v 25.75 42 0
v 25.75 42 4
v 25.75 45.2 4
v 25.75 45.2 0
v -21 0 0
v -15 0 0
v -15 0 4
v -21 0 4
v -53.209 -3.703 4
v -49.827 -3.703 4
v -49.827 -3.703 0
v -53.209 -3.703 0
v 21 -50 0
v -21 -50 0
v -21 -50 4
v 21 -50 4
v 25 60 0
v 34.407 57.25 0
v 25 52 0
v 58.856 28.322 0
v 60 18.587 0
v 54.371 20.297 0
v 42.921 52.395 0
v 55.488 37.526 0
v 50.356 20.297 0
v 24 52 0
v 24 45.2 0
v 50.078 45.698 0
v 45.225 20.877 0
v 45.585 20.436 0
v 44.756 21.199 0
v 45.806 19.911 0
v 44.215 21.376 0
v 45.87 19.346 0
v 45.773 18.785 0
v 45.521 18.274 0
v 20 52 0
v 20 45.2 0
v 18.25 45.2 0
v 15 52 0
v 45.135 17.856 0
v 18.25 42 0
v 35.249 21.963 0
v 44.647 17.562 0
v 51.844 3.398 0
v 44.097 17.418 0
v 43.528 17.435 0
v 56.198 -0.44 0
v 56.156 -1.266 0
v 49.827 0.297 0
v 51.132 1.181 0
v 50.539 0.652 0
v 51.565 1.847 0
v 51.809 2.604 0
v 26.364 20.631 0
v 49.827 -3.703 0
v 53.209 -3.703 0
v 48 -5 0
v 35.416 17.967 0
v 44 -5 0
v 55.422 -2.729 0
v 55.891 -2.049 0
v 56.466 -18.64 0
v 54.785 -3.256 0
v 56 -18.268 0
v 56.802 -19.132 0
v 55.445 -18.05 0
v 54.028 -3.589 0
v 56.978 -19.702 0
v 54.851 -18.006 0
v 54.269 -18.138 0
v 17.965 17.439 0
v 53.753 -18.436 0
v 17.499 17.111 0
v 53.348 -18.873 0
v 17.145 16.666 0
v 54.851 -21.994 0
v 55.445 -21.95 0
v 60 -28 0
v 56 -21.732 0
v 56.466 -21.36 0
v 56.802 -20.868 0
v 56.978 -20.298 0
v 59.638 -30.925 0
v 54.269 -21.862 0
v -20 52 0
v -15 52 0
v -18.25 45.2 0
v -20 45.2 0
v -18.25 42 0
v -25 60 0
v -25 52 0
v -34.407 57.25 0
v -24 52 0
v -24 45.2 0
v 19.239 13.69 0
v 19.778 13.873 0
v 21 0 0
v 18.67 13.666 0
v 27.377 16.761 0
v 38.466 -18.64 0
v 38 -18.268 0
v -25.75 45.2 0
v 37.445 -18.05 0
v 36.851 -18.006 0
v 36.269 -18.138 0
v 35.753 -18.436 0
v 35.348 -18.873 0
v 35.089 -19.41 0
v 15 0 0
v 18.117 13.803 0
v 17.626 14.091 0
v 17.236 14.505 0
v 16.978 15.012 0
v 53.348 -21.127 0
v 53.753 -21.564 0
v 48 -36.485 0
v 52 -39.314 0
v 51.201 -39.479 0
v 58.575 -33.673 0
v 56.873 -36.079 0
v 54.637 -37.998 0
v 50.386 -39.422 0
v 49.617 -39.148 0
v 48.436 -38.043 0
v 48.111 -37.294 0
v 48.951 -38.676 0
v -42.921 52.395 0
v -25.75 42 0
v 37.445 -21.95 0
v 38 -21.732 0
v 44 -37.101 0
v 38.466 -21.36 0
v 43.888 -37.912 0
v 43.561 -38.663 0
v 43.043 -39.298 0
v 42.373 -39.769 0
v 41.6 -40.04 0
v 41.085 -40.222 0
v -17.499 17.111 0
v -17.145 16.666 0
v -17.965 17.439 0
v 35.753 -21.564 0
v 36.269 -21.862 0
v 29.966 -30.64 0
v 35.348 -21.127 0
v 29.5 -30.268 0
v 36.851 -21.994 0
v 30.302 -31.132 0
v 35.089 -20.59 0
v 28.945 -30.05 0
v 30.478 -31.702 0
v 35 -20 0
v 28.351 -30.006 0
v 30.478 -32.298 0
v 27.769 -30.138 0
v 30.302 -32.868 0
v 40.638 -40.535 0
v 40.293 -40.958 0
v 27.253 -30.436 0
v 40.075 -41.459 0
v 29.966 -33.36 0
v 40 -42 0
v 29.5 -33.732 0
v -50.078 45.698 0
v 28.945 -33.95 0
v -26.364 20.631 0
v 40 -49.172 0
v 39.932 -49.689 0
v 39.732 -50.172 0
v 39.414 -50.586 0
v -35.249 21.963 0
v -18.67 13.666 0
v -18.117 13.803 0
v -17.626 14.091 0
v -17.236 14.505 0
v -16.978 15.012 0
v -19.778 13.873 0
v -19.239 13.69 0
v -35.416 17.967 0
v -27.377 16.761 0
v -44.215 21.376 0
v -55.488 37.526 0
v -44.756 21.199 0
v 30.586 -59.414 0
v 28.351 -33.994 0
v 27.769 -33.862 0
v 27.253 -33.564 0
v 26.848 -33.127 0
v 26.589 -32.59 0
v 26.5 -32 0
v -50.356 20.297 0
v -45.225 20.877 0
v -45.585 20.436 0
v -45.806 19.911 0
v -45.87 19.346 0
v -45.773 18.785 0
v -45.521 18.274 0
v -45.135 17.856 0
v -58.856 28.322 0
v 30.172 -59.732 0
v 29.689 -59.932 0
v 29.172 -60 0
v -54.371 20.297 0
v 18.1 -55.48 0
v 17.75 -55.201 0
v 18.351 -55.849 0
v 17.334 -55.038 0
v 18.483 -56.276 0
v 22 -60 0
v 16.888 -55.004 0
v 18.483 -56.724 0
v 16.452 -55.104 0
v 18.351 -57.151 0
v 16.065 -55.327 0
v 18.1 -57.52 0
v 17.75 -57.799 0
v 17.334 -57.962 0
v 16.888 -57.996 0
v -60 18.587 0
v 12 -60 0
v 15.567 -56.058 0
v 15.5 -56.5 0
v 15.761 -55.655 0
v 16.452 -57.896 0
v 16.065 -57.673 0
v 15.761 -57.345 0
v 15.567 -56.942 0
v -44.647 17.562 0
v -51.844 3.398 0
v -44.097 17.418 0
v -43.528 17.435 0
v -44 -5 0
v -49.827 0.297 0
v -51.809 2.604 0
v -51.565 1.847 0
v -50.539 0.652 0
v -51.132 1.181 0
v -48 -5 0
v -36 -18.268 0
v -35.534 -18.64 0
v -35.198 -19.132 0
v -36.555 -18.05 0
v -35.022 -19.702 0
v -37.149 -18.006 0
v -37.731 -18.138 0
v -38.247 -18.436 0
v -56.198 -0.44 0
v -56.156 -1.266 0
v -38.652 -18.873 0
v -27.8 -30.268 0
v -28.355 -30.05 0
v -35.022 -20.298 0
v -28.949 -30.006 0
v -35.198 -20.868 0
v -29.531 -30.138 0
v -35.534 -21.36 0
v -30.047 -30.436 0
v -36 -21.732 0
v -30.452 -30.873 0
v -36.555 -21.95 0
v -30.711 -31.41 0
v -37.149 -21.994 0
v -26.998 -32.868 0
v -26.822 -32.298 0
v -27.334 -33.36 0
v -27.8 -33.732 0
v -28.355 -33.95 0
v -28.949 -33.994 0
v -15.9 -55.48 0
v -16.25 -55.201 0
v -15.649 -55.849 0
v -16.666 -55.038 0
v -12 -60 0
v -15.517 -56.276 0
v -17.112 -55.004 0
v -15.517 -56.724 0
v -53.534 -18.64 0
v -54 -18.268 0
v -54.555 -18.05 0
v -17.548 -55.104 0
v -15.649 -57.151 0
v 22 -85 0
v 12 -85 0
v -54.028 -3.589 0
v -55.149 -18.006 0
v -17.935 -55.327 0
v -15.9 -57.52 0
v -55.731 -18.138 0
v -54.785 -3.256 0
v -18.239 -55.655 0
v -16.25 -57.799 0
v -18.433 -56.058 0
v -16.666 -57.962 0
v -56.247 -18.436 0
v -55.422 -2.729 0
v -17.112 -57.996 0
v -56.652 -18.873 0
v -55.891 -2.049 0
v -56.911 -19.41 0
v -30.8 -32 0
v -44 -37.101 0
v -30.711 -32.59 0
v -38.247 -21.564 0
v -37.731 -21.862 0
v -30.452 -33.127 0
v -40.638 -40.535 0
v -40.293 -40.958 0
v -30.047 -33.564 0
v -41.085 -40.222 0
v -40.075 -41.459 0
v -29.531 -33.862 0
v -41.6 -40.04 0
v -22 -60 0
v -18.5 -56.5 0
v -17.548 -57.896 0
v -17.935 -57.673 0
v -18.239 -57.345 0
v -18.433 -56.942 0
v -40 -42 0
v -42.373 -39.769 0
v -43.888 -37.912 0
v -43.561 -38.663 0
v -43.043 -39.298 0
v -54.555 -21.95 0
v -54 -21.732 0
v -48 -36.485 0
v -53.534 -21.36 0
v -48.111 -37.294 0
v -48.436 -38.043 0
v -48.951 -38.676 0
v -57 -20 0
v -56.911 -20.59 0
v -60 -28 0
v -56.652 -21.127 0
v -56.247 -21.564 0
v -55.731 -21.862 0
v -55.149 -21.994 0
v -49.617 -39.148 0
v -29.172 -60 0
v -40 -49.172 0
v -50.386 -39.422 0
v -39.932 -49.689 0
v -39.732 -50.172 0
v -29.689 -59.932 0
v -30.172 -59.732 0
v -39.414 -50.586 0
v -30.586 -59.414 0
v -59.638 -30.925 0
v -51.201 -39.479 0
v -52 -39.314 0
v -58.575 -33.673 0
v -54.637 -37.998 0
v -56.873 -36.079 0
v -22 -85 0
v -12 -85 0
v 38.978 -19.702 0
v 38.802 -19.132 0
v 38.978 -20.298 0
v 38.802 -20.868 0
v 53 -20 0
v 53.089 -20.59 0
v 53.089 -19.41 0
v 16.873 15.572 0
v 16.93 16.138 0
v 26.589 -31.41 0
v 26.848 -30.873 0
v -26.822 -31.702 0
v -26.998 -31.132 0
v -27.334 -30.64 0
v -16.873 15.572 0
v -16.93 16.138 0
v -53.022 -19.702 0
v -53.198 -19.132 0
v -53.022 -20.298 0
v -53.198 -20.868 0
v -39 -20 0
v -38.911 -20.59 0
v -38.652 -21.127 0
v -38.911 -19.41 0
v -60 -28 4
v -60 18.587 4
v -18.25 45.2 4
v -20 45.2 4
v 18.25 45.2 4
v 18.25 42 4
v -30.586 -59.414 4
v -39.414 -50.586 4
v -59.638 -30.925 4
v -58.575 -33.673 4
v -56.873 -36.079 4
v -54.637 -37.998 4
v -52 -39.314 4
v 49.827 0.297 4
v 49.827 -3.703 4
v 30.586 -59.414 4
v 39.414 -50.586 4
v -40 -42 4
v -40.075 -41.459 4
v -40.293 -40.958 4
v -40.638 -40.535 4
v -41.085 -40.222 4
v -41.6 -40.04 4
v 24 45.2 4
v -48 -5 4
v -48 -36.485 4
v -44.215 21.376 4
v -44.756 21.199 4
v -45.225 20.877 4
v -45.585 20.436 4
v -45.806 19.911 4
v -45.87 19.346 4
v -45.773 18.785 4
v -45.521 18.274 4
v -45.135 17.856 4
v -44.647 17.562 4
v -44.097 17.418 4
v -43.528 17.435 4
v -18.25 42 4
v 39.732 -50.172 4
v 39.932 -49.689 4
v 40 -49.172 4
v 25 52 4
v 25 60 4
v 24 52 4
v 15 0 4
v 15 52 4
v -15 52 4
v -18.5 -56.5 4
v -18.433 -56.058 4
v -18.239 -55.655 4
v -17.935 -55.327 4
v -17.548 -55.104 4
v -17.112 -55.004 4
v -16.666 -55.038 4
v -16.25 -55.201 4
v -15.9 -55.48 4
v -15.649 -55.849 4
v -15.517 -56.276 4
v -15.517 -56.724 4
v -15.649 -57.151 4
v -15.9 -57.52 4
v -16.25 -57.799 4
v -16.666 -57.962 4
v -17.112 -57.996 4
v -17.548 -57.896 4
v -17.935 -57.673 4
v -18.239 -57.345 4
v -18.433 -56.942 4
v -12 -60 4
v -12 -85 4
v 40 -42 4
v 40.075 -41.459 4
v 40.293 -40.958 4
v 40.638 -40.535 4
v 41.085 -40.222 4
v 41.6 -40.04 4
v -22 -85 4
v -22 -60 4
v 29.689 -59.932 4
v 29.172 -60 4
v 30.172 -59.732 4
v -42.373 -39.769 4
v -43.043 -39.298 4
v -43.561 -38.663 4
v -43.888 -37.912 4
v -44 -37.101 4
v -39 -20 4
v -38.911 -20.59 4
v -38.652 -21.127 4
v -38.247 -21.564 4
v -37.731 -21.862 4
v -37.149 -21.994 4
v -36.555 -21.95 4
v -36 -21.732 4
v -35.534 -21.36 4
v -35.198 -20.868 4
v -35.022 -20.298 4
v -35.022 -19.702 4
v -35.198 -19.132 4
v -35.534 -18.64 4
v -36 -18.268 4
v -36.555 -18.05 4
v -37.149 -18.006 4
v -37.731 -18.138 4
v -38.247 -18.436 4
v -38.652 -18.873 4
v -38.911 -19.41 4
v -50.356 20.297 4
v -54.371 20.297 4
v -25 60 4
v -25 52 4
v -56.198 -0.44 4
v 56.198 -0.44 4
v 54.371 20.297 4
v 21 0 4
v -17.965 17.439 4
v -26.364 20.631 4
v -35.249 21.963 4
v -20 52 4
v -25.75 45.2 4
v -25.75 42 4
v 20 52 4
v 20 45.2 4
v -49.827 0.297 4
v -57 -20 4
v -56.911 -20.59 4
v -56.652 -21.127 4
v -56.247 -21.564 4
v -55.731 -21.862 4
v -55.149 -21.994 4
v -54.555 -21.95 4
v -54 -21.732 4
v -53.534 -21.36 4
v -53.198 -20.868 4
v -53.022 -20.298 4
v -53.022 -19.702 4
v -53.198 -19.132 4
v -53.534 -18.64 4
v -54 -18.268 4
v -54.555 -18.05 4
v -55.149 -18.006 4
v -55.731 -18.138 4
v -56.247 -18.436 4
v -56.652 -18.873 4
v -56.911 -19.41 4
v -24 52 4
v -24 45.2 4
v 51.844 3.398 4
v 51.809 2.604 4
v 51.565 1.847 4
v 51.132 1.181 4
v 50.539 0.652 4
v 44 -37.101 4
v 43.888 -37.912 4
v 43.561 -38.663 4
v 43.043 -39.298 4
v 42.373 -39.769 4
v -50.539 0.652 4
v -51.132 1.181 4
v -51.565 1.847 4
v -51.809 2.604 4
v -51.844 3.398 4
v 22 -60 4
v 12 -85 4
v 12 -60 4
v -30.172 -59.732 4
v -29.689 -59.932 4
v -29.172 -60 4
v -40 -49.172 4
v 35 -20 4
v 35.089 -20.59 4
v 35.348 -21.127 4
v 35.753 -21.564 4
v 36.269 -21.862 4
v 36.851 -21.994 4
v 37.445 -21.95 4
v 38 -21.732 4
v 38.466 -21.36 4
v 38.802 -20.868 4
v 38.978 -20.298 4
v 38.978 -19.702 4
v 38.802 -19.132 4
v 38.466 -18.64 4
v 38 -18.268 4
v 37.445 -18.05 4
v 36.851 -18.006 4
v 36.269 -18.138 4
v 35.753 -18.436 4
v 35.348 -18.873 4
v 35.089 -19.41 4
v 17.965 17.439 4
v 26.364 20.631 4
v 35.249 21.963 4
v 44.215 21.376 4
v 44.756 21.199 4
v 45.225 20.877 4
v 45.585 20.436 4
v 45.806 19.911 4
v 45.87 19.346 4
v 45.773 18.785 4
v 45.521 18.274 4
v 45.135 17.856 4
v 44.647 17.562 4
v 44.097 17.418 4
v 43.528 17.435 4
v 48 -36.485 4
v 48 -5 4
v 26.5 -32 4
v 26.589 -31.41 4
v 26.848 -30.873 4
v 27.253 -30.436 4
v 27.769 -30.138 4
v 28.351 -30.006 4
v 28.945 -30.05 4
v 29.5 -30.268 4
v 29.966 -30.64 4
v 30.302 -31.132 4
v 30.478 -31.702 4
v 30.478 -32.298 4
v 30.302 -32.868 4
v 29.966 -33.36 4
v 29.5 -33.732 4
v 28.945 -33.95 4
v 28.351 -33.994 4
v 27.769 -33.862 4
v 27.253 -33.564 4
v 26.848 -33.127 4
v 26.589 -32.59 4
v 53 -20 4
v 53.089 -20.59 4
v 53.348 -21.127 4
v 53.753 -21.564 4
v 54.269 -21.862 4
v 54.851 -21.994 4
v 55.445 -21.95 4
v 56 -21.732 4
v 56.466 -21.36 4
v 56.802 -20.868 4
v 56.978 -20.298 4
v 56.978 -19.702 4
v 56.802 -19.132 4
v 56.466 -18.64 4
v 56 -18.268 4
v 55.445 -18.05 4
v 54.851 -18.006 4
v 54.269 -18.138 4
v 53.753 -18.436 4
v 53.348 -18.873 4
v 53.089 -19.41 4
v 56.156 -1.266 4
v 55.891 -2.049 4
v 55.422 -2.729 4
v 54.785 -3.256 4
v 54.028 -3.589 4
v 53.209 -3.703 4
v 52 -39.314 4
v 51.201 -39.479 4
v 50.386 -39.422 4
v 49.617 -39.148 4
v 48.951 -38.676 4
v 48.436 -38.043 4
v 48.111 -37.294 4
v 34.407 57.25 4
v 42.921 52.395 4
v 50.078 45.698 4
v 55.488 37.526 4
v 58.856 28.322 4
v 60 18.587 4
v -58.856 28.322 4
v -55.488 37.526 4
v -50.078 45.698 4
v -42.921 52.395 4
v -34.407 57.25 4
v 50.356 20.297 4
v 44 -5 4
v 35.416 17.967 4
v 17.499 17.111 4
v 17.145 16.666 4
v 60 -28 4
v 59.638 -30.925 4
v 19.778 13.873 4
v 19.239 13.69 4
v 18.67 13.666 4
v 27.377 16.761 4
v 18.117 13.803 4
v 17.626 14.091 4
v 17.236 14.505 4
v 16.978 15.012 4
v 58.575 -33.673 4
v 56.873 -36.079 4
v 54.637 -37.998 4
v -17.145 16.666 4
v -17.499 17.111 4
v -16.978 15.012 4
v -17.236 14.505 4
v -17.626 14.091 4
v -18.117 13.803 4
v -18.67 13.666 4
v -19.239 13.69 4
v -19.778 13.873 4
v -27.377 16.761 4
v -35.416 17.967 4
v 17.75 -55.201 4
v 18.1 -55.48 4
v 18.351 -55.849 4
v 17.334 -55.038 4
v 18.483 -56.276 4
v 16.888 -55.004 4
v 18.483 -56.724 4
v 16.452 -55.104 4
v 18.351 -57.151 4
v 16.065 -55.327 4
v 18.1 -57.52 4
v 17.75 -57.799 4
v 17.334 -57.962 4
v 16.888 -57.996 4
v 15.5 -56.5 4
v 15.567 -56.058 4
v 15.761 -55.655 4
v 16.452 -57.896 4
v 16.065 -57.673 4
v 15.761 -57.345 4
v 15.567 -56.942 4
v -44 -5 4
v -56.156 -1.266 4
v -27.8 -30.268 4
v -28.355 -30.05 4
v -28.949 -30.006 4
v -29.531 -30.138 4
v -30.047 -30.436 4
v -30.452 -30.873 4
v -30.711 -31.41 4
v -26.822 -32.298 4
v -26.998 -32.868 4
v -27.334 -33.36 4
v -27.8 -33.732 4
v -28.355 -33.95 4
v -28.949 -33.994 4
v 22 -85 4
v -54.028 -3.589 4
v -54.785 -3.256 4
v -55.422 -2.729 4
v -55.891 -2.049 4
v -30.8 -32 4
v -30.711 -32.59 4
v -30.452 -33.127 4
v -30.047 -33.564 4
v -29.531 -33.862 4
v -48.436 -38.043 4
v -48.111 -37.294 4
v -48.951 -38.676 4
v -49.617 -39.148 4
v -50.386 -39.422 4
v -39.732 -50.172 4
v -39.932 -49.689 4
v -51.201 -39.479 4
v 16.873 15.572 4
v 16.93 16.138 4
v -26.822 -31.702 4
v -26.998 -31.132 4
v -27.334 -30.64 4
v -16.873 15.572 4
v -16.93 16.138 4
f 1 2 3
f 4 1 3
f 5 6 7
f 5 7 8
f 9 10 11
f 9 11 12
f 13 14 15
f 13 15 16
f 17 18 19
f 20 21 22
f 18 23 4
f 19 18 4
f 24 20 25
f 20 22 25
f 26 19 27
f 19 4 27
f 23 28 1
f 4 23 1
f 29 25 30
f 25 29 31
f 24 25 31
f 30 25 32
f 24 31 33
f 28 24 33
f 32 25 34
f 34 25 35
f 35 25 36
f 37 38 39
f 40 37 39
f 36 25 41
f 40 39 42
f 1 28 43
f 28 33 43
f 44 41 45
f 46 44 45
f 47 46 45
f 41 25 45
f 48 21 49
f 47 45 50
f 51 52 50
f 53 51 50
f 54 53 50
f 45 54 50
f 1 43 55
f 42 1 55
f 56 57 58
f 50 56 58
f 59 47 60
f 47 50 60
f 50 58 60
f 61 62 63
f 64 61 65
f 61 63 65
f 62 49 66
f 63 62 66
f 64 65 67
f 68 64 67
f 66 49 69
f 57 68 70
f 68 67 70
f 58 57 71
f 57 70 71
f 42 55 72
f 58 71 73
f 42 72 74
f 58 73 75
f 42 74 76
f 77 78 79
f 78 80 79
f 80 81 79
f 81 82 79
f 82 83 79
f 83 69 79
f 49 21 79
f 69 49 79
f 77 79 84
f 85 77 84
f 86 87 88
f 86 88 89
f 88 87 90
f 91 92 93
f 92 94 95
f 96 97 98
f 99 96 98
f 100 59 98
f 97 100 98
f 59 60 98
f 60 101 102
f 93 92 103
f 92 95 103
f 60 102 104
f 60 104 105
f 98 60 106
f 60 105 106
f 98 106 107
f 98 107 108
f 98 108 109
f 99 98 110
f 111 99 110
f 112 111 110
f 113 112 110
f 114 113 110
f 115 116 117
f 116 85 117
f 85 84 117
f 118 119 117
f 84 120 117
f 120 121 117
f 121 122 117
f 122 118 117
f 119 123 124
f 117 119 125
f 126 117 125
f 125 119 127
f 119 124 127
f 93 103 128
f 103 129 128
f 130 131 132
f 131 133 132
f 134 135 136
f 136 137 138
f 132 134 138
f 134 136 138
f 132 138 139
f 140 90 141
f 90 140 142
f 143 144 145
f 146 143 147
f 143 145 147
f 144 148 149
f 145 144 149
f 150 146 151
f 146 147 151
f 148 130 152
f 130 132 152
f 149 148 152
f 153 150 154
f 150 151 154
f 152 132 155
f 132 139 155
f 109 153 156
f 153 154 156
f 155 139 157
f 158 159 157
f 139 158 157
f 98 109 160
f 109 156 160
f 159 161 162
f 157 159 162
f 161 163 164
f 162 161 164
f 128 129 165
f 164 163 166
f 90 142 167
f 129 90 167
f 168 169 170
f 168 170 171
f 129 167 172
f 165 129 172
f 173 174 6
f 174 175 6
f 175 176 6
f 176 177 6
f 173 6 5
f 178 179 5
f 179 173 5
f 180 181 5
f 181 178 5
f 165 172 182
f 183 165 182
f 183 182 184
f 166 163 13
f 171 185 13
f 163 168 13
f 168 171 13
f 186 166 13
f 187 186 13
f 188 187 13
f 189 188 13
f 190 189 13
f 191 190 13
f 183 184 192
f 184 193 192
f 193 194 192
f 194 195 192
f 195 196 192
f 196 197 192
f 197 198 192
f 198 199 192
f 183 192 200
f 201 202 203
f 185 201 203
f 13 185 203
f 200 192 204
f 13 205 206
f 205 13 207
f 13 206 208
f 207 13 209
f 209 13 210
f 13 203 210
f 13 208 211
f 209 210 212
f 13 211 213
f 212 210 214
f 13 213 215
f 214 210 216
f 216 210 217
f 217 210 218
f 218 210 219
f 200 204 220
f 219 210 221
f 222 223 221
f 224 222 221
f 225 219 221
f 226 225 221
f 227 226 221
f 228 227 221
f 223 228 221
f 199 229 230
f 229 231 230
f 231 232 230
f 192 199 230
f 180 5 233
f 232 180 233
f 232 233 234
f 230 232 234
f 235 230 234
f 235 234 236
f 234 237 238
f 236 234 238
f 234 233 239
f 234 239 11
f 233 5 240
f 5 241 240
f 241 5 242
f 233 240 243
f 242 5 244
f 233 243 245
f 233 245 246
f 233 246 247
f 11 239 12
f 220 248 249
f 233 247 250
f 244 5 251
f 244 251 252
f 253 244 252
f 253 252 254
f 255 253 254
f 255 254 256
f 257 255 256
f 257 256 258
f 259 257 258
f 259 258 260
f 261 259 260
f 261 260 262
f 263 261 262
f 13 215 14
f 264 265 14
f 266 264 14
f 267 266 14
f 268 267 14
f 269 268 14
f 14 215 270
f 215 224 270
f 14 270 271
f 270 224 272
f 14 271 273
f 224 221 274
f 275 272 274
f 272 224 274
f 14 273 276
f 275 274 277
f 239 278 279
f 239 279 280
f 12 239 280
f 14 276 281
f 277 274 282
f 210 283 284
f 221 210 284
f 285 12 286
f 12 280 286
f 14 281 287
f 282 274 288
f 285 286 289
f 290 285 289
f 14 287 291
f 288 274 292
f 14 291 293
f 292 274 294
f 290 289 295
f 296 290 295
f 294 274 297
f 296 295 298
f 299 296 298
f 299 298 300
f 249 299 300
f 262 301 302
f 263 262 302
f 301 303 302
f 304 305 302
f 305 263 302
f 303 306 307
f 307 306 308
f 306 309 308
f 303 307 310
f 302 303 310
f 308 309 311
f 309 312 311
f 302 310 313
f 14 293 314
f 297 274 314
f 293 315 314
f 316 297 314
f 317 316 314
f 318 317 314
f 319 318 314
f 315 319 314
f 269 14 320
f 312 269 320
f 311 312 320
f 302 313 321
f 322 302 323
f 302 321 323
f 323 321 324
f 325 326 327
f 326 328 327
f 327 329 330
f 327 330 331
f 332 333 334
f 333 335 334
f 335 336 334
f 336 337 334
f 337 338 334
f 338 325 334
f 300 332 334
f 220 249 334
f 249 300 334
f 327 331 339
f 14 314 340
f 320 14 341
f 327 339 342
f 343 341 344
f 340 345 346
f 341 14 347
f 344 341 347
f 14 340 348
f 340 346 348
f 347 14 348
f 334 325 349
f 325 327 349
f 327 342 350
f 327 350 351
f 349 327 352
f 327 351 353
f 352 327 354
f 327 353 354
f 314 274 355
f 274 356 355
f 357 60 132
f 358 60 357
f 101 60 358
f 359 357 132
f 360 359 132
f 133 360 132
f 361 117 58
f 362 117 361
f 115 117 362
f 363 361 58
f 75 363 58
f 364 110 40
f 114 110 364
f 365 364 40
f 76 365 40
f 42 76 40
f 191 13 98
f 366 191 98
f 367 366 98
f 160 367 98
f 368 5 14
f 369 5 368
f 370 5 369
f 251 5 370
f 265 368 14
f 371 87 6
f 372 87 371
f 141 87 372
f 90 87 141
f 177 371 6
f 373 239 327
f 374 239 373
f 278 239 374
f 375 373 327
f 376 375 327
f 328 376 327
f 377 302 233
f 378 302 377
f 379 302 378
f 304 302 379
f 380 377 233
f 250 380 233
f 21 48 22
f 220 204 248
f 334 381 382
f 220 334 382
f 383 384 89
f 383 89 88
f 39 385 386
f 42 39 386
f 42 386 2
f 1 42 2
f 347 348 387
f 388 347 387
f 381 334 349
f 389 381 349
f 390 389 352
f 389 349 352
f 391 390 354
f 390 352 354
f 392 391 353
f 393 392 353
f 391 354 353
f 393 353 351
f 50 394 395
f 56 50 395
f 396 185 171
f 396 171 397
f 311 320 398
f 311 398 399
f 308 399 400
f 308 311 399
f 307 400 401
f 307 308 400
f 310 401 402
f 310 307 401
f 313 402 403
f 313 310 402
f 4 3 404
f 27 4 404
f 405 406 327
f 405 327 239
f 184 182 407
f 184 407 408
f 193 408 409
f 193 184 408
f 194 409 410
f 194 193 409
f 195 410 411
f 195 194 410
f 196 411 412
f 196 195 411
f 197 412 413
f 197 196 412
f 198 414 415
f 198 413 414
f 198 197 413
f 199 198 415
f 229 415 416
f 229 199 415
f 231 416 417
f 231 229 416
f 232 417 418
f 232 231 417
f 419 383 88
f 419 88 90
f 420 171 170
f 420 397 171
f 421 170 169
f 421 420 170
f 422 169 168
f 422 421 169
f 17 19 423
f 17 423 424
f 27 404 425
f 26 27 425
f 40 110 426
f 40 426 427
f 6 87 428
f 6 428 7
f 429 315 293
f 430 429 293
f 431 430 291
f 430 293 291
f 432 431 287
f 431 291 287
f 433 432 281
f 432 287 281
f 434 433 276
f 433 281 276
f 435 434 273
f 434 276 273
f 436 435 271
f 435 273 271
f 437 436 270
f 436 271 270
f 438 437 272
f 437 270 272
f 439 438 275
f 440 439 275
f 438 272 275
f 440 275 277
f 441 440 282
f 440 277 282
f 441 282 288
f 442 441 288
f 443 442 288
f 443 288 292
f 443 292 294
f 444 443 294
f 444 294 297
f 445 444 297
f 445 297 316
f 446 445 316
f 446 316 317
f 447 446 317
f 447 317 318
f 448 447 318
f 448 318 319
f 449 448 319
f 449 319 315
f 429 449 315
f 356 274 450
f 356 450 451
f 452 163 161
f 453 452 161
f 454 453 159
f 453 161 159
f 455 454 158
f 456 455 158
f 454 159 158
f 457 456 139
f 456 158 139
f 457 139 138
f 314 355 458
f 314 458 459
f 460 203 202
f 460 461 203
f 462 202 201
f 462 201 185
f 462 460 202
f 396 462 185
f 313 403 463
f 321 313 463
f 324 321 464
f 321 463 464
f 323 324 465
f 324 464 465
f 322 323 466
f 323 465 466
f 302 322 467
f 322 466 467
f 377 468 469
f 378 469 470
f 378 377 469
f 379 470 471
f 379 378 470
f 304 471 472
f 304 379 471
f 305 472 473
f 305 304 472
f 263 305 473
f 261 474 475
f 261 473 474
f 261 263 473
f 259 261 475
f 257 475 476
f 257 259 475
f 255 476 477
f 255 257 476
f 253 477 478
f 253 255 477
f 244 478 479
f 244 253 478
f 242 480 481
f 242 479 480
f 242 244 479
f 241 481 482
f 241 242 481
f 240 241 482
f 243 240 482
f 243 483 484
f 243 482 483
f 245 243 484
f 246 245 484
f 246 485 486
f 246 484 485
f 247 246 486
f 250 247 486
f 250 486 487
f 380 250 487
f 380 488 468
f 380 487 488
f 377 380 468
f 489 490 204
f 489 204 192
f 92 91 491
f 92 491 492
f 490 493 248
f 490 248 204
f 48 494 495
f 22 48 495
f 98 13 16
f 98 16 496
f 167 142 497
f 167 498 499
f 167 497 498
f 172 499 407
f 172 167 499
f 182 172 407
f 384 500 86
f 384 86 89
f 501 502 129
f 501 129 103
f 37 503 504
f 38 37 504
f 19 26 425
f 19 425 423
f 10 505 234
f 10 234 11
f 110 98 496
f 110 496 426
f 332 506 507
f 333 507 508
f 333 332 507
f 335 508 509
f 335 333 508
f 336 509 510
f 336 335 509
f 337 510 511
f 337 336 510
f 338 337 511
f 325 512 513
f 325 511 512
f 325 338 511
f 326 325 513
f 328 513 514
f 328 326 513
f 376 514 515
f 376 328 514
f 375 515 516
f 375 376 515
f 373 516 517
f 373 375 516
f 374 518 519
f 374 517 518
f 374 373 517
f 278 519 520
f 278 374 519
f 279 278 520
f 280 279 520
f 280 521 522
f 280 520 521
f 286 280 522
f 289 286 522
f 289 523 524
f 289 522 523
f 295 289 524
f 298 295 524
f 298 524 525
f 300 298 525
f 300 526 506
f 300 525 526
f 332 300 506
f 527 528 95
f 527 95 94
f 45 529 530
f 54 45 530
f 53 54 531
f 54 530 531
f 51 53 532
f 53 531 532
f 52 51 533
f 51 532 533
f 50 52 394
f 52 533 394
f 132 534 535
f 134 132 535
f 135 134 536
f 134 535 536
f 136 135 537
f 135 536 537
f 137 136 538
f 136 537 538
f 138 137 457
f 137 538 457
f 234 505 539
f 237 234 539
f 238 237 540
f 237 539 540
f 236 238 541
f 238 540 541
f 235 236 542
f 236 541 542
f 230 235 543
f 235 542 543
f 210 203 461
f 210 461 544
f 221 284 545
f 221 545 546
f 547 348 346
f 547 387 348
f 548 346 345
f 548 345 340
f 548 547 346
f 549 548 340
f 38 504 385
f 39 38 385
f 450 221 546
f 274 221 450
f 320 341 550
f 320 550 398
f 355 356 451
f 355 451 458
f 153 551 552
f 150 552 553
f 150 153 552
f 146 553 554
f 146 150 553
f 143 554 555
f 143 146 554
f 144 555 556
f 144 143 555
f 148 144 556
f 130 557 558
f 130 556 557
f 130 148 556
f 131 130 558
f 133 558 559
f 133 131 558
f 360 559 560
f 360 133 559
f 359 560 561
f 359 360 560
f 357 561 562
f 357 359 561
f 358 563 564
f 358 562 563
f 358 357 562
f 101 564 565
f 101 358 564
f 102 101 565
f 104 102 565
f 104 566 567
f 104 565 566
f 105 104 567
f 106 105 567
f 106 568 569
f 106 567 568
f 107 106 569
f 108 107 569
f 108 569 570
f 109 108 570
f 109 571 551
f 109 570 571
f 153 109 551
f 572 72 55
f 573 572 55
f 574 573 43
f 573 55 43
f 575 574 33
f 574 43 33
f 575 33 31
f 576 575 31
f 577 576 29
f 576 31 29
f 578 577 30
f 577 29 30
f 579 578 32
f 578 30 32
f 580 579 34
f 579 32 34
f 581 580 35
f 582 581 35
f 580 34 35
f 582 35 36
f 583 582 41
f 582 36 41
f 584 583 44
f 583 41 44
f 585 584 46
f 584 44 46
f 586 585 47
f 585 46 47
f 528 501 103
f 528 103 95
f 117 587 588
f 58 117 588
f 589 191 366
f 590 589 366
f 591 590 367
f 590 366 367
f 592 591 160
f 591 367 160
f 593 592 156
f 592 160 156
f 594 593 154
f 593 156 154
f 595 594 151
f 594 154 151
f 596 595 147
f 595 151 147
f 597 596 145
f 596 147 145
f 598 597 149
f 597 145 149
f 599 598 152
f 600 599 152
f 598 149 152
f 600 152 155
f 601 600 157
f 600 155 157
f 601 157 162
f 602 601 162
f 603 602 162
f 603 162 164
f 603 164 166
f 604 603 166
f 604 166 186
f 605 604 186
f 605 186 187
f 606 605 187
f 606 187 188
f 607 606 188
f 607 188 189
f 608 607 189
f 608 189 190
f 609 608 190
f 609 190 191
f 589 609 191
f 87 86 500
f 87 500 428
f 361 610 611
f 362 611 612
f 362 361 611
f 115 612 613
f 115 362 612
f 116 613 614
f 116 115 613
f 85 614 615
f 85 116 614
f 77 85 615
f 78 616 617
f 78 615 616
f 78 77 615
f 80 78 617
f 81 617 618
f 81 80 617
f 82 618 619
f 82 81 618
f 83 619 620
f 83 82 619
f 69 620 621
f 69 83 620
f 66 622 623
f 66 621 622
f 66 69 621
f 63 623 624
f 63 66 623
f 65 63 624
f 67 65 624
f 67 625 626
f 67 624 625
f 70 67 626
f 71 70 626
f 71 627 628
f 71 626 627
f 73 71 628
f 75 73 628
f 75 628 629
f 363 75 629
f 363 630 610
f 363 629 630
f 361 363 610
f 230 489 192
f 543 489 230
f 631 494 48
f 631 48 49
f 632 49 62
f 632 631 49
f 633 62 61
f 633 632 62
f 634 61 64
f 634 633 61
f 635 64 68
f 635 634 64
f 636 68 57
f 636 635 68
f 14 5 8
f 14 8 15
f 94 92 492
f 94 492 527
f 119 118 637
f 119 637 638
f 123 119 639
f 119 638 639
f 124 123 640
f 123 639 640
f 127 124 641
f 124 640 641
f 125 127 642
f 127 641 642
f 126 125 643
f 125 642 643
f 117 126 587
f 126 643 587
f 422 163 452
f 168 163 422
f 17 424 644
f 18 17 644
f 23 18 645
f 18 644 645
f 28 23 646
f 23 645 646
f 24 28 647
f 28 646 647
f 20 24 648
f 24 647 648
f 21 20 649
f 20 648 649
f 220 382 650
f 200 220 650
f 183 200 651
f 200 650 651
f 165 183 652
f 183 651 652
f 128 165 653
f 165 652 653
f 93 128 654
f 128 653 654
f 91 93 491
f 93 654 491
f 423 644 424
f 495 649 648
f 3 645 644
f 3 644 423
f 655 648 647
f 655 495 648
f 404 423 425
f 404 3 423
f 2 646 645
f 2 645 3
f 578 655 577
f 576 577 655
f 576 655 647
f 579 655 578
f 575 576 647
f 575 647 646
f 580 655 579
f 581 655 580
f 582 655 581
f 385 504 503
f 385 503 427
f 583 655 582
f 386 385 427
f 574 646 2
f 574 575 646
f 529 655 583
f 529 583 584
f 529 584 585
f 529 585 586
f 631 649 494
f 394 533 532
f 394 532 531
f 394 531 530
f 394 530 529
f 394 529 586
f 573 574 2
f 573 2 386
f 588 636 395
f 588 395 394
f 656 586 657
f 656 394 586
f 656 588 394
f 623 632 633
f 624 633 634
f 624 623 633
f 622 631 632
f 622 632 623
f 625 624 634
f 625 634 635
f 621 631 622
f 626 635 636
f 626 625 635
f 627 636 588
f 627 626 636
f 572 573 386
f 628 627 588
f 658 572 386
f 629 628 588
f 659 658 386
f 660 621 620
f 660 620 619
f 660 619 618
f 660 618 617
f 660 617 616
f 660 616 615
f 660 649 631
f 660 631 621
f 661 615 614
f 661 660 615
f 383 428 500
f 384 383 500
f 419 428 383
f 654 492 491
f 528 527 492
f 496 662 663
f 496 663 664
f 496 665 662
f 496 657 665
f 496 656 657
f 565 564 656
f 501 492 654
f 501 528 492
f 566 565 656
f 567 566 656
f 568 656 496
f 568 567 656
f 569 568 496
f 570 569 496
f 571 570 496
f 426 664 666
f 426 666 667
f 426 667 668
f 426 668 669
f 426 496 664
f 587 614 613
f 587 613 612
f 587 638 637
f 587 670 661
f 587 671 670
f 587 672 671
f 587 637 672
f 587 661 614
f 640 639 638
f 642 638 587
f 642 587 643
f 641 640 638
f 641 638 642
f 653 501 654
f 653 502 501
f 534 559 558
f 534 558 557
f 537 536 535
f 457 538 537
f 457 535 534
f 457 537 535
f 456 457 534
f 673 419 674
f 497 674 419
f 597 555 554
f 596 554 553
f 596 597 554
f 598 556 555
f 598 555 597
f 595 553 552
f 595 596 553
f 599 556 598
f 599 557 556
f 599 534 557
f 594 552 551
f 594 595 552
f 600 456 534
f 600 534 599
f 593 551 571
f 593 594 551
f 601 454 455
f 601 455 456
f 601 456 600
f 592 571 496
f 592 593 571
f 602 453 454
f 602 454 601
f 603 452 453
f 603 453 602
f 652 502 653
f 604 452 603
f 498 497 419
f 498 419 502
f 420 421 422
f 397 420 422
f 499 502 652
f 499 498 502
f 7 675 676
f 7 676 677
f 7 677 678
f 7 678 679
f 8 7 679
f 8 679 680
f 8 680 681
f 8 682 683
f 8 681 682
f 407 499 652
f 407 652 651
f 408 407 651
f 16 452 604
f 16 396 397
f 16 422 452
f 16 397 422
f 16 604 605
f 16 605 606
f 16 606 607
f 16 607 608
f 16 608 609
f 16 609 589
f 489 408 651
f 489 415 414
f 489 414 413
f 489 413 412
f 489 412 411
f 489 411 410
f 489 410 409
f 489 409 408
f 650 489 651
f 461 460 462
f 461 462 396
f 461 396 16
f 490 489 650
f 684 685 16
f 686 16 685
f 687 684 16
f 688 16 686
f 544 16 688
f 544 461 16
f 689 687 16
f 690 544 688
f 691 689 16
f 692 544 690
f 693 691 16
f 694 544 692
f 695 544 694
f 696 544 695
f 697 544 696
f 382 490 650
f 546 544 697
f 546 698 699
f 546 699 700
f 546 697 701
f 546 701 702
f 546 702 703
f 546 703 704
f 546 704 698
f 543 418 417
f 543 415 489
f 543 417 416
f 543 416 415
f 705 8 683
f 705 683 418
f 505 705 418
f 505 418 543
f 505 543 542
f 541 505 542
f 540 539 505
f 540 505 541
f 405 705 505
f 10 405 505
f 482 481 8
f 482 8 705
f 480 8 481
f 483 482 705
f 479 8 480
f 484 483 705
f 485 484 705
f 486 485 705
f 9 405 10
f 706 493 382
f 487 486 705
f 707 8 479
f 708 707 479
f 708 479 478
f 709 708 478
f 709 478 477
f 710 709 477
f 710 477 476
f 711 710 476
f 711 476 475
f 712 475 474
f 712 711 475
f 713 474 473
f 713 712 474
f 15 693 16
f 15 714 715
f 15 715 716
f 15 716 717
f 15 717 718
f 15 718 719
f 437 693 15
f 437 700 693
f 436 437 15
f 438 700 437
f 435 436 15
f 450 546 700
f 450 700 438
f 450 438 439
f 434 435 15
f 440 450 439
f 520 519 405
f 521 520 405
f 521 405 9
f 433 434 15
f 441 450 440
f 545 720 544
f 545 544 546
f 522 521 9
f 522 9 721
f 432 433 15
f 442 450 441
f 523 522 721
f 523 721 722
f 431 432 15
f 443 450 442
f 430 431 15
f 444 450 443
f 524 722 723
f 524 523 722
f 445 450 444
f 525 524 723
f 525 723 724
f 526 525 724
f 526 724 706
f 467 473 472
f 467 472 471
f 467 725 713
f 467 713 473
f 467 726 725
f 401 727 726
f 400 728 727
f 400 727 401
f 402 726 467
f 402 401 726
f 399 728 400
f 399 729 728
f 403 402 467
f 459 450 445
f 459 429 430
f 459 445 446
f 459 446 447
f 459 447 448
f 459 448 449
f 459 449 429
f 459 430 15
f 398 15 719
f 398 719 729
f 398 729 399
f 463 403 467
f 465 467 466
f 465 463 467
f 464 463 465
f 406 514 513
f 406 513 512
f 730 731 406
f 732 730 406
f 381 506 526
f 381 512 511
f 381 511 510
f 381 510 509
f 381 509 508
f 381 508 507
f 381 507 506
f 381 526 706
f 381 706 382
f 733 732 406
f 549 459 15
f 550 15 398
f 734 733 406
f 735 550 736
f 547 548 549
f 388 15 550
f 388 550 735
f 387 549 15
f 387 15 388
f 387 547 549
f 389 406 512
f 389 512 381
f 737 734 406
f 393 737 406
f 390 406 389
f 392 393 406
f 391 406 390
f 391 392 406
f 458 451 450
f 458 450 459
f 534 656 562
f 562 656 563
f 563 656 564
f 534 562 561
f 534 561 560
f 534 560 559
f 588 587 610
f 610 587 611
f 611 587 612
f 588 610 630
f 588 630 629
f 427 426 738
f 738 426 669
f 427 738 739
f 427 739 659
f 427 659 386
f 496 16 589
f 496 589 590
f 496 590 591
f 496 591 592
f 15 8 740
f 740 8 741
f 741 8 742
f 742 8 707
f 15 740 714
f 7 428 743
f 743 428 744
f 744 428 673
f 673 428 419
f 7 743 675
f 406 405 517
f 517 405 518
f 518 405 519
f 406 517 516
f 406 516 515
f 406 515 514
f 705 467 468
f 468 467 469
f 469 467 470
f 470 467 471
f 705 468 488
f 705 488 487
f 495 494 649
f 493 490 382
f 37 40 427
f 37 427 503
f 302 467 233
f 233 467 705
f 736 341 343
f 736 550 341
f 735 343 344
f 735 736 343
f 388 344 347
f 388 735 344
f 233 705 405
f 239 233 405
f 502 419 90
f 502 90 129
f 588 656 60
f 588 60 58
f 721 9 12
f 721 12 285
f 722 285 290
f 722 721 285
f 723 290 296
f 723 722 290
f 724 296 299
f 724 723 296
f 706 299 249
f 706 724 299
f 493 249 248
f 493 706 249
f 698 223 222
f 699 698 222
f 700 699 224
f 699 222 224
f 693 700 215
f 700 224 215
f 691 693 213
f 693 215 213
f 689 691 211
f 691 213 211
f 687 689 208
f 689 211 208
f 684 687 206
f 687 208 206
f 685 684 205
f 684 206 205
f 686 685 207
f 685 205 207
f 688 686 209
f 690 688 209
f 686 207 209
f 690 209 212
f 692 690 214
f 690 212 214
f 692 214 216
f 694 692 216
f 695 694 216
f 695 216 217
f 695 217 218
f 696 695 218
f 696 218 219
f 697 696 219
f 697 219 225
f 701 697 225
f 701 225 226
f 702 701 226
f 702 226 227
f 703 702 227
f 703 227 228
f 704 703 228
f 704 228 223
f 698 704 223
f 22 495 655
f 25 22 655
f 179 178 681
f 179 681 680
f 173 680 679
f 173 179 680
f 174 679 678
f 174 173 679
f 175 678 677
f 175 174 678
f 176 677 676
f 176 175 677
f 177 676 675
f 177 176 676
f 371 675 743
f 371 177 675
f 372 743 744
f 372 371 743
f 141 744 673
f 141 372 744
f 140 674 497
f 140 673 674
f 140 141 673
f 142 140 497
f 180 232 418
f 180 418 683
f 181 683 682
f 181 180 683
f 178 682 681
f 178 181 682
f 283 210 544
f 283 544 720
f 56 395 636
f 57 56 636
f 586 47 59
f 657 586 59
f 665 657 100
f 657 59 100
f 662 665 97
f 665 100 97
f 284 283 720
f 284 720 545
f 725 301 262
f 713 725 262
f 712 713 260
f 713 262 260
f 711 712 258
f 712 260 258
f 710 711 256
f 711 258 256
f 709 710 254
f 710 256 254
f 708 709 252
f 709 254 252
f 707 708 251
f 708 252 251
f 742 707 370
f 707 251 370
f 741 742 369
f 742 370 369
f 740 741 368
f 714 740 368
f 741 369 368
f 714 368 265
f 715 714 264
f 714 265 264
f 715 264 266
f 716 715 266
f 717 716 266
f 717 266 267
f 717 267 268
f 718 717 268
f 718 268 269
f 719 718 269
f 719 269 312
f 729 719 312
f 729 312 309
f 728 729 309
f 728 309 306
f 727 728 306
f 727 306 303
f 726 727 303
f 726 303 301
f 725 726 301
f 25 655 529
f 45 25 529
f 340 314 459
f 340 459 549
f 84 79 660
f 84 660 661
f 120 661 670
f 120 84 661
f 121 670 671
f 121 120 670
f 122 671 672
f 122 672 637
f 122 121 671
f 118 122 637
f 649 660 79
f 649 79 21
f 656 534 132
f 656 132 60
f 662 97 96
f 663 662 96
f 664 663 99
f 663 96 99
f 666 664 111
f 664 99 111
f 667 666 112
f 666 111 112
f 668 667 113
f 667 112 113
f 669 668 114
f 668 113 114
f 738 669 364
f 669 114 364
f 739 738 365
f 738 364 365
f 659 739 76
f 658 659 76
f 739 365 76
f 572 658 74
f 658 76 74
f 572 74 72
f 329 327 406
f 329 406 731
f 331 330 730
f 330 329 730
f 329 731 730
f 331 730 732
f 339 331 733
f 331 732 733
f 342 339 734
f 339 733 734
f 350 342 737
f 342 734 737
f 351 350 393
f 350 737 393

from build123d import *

# Parameters (mm, degrees)
BOSS_EXTRUDE1_DEPTH = 4
SKETCH2_R           = 2
SKETCH2_R_2         = 1.5
CUT_EXTRUDE1_DEPTH  = 95.026591983
SKETCH4_W           = 20
SKETCH4_H           = 100
BOSS_EXTRUDE2_DEPTH = 4
FILLET3_R           = 42
FILLET4_R           = 12
SKETCH7_R           = 2
CUT_EXTRUDE3_DEPTH  = 105.120122935
CHAMFER1_SIZE       = 10
FILLET8_R           = 2
CUT_EXTRUDE4_DEPTH  = 105.120122935
CUT_EXTRUDE5_DEPTH  = 105.120122935
SKETCH10_W          = 4
SKETCH10_H          = 35
CUT_EXTRUDE6_DEPTH  = 105.120122935
FILLET9_R           = 3


with BuildPart() as part:
    # Sketch1 → Boss-Extrude1 (new body)
    with BuildSketch(Plane.XY):
        Polygon((-40, 60), (-25, 60), (-25, 52), (-15, 52), (-15, 0), (-21, 0), (-21, -50), (21, -50), (21, 0), (15, 0), (15, 52), (25, 52), (25, 60), (40, 60), (40, -60), (22, -60), (22, -85), (12, -85), (12, -60), (-12, -60), (-12, -85), (-22, -85), (-22, -60), (-40, -60), align=None)
    extrude(amount=BOSS_EXTRUDE1_DEPTH)

    # Sketch2 → Cut-Extrude1 (cut, through all)
    with BuildSketch(Plane(origin=(0, 0, 0), x_dir=(-1, 0, 0), z_dir=(0, 0, -1))):
        with Locations((-28.5, -32)):
            Circle(SKETCH2_R)
        with Locations((17, -56.5)):
            Circle(SKETCH2_R_2)
        with Locations((28.8, -32)):
            Circle(SKETCH2_R)
        with Locations((-17, -56.5)):
            Circle(SKETCH2_R_2)
    extrude(amount=-CUT_EXTRUDE1_DEPTH, mode=Mode.SUBTRACT)

    # Sketch4 → Boss-Extrude2 (add)
    with BuildSketch(Plane.XY.offset(4)):
        with Locations((-50, 10)):
            Rectangle(SKETCH4_W, SKETCH4_H)
        with Locations((50, 10)):
            Rectangle(SKETCH4_W, SKETCH4_H)
    extrude(amount=-BOSS_EXTRUDE2_DEPTH)

    # Fillet3
    # the kernel refuses this fillet: 42 mm, written as the material it takes off along each edge
    with BuildSketch(Plane(origin=(60, 60, 107.531396204), x_dir=(0, -1, 0), z_dir=(0, 0, -1))) as fillet3_piece_1:
        with BuildLine():
            CenterArc((41.412558482, 42), FILLET3_R, 189.594068227, 80.405931773)
            Line((0, 35), (-0.82825117, 34.86))
            ThreePointArc((-0.82825117, 34.86), (-0.84, 17.5), (-0.84, 0))
            Line((-0.84, 0), (0, -0.84))
            Line((0, -0.84), (41.412558482, -0.84))
            Line((41.412558482, -0.84), (41.412558482, 0))
        make_face()
    extrude(amount=211.062792409, mode=Mode.SUBTRACT)
    with BuildSketch(Plane(origin=(-60, 60, 107.531396204), x_dir=(1, 0, 0), z_dir=(0, 0, -1))) as fillet3_piece_2:
        with BuildLine():
            CenterArc((42, 41.412558482), FILLET3_R, 180, 80.405931773)
            Line((0, 41.412558482), (-0.84, 41.412558482))
            Line((-0.84, 41.412558482), (-0.84, 0))
            Line((-0.84, 0), (0, -0.84))
            ThreePointArc((0, -0.84), (17.5, -0.84), (34.86, -0.82825117))
            Line((34.86, -0.82825117), (35, 0))
        make_face()
    extrude(amount=211.062792409, mode=Mode.SUBTRACT)

    # Fillet4
    fillet4_edges = [part.edges().sort_by_distance(p)[0] for p in [
        (60, -40, 2),
        (-60, -40, 2),
    ]]
    fillet(fillet4_edges, radius=FILLET4_R)

    # Sketch7 → Cut-Extrude3 (cut, through all)
    with BuildSketch(Plane.XY):
        with Locations(Location((-55, -20, 0), (0, 0, 180))):
            Circle(SKETCH7_R)
        with Locations(Location((55, -20, 0), (0, 0, 180))):
            Circle(SKETCH7_R)
        with Locations(Location((-37, -20, 0), (0, 0, 180))):
            Circle(SKETCH7_R)
        with Locations(Location((37, -20, 0), (0, 0, 180))):
            Circle(SKETCH7_R)
    extrude(amount=CUT_EXTRUDE3_DEPTH, mode=Mode.SUBTRACT)

    # Chamfer1
    chamfer1_edges = [part.edges().sort_by_distance(p)[0] for p in [
        (-40, -60, 2),
        (40, -60, 2),
    ]]
    chamfer(chamfer1_edges, length=CHAMFER1_SIZE)

    # Fillet8
    fillet8_edges = [part.edges().sort_by_distance(p)[0] for p in [
        (-30, -60, 2),
        (-40, -50, 2),
        (30, -60, 2),
        (40, -50, 2),
        (40, -40, 2),
        (-40, -40, 2),
    ]]
    fillet(fillet8_edges, radius=FILLET8_R)

    # Sketch8 → Cut-Extrude4 (cut, through all)
    with BuildSketch(Plane(origin=(0, 0, 0), x_dir=(-1, 0, 0), z_dir=(0, 0, -1))):
        with BuildLine():
            ThreePointArc((-17.964817996, 17.438774634), (-30.770630407, 21.535466224), (-44.214817996, 21.375674028))
            ThreePointArc((-44.214817996, 21.375674028), (-45.841525426, 19.061841075), (-43.527692473, 17.435133644))
            ThreePointArc((-43.527692473, 17.435133644), (-31.363903701, 17.579707536), (-19.777692473, 13.87317705))
            ThreePointArc((-19.777692473, 13.87317705), (-17.088456442, 14.749538603), (-17.964817996, 17.438774634))
        make_face()
        with BuildLine():
            ThreePointArc((17.964817996, 17.438774634), (30.770630407, 21.535466224), (44.214817996, 21.375674028))
            ThreePointArc((44.214817996, 21.375674028), (45.841525426, 19.061841075), (43.527692473, 17.435133644))
            ThreePointArc((43.527692473, 17.435133644), (31.363903701, 17.579707536), (19.777692473, 13.87317705))
            ThreePointArc((19.777692473, 13.87317705), (17.088456442, 14.749538603), (17.964817996, 17.438774634))
        make_face()
    extrude(amount=-CUT_EXTRUDE4_DEPTH, mode=Mode.SUBTRACT)

    # Sketch9 → Cut-Extrude5 (cut, through all)
    with BuildSketch(Plane.XY.offset(4)):
        Polygon((-24, 52), (-20, 52), (-20, 45.2), (-18.25, 45.2), (-18.25, 42), (-25.75, 42), (-25.75, 45.2), (-24, 45.2), align=None)
    cut_extrude5 = extrude(amount=-CUT_EXTRUDE5_DEPTH, mode=Mode.SUBTRACT)

    # Mirror1: Cut-Extrude5 across plane
    add(cut_extrude5.mirror(Plane(origin=(0, 0, 0), x_dir=(0, 0, 1), z_dir=(1, 0, 0))), mode=Mode.SUBTRACT)

    # Sketch10 → Cut-Extrude6 (cut, through all)
    with BuildSketch(Plane.XY.offset(4)):
        with Locations((46, -22.5)):
            Rectangle(SKETCH10_W, SKETCH10_H)
        Polygon((49.827462353, 0.296846572), (49.827462353, -3.703153428), (56.485281374, -3.703153428), (54.371414492, 20.296846572), (50.355929074, 20.296846572), (52.117484809, 0.296846572), align=None)
    cut_extrude6 = extrude(amount=-CUT_EXTRUDE6_DEPTH, mode=Mode.SUBTRACT)

    # Mirror2: Cut-Extrude6 across plane
    add(cut_extrude6.mirror(Plane(origin=(0, 0, 0), x_dir=(0, 0, 1), z_dir=(1, 0, 0))), mode=Mode.SUBTRACT)

    # Fillet9
    # the kernel refuses this fillet: 3 mm, written as the material it adds along each edge
    with BuildSketch(Plane(origin=(56.485281374, -3.703153428, 4), x_dir=(-1, 0, 0), z_dir=(0, 0, -1))) as fillet9_piece_1:
        with BuildLine():
            CenterArc((FILLET9_R * 1.09194914132, FILLET9_R), FILLET9_R, 174.966503844, 95.033496156)
            Line((FILLET9_R * 0.0958055662996, FILLET9_R * 1.08773812138), (0, 0))
            Line((0, 0), (FILLET9_R * 1.09194914132, 0))
        make_face()
    extrude(amount=4)
    with BuildSketch(Plane(origin=(-56.485281374, -3.703153428, 4), x_dir=(1, 0, 0), z_dir=(0, 0, -1))) as fillet9_piece_2:
        with BuildLine():
            CenterArc((FILLET9_R * 1.09194914132, -FILLET9_R), FILLET9_R, 90, 95.033496156)
            Line((FILLET9_R * 0.0958055662996, -FILLET9_R * 1.08773812138), (0, 0))
            Line((0, 0), (FILLET9_R * 1.09194914132, 0))
        make_face()
    extrude(amount=4)
    # the kernel refuses this fillet: 3 mm, written as the material it takes off along each edge
    with BuildSketch(Plane(origin=(52.117484809, 0.296846572, 11.783837895), x_dir=(-1, 0, 0), z_dir=(0, 0, -1))) as fillet9_2_piece_1:
        with BuildLine():
            CenterArc((3.261606451, 2.838313679), FILLET9_R, 174.966503844, 76.136892771)
            Line((0.273175726, 3.101528043), (0, 0))
            Line((0, 0), (2.290022456, 0))
        make_face()
    extrude(amount=19.56767579, mode=Mode.SUBTRACT)
    with BuildSketch(Plane(origin=(48, -40, 14.146118724), x_dir=(0, 1, 0), z_dir=(0, 0, -1))) as fillet9_2_piece_2:
        with BuildLine():
            CenterArc((3.514718626, 3), FILLET9_R, 160.528779366, 109.471220634)
            ThreePointArc((0.686291501, 4), (0.172817284, 2.029223745), (0, 0))
            Line((0, 0), (3.514718626, 0))
        make_face()
    extrude(amount=24.292237447, mode=Mode.SUBTRACT)
    with BuildSketch(Plane(origin=(44, -40, 11.247448714), x_dir=(-0.9998582920116396, -0.01683436650328442, 0), z_dir=(0, 0, -1))) as fillet9_2_piece_3:
        with BuildLine():
            CenterArc((2.950772393, 2.949071777), FILLET9_R, 180.964583715, 78.463040967)
            Line((-0.048802483, 2.898568677), (-0.348759971, 2.893518367))
            Line((-0.348759971, 2.893518367), (-0.299957488, -0.00505031))
            Line((-0.299957488, -0.00505031), (0.00505031, -0.299957488))
            ThreePointArc((0.00505031, -0.299957488), (2.004766894, -0.266288755), (2.345296923, -0.294907178))
            Line((2.345296923, -0.294907178), (2.400340147, 0))
        make_face()
    extrude(amount=18.494897428, mode=Mode.SUBTRACT)
    with BuildSketch(Plane(origin=(-44, -40, 11.247448714), x_dir=(0, 1, 0), z_dir=(0, 0, -1))) as fillet9_2_piece_4:
        with BuildLine():
            CenterArc((2.898979486, 3), FILLET9_R, 191.536959033, 78.463040967)
            Line((-0.040408206, 2.4), (-0.334346975, 2.34))
            ThreePointArc((-0.334346975, 2.34), (-0.3, 2), (-0.3, 0))
            Line((-0.3, 0), (0, -0.3))
            Line((0, -0.3), (2.898979486, -0.3))
            Line((2.898979486, -0.3), (2.898979486, 0))
        make_face()
    extrude(amount=18.494897428, mode=Mode.SUBTRACT)
    with BuildSketch(Plane(origin=(-48, -40, 14.146118724), x_dir=(-0.9855985596534866, 0.16910197872577487, 0), z_dir=(0, 0, -1))) as fillet9_2_piece_5:
        with BuildLine():
            CenterArc((3.551141553, 2.956795679), FILLET9_R, 170.264389683, 109.471220634)
            Line((0.594345874, 3.464101615), (0, 0))
            ThreePointArc((0, 0), (2.029223745, -0.172817284), (4.058447489, 0))
        make_face()
    extrude(amount=24.292237447, mode=Mode.SUBTRACT)
    with BuildSketch(Plane(origin=(-52.117484809, 0.296846572, 11.783837895), x_dir=(0.08773812137778342, 0.9961435750217422, 0), z_dir=(0, 0, -1))) as fillet9_2_piece_6:
        with BuildLine():
            CenterArc((3.113535158, 3), FILLET9_R, 193.863107229, 76.136892771)
            Line((0.200922268, 2.281191156), (0, 0))
            Line((0, 0), (3.113535158, 0))
        make_face()
    extrude(amount=19.56767579, mode=Mode.SUBTRACT)


solid = part.part
